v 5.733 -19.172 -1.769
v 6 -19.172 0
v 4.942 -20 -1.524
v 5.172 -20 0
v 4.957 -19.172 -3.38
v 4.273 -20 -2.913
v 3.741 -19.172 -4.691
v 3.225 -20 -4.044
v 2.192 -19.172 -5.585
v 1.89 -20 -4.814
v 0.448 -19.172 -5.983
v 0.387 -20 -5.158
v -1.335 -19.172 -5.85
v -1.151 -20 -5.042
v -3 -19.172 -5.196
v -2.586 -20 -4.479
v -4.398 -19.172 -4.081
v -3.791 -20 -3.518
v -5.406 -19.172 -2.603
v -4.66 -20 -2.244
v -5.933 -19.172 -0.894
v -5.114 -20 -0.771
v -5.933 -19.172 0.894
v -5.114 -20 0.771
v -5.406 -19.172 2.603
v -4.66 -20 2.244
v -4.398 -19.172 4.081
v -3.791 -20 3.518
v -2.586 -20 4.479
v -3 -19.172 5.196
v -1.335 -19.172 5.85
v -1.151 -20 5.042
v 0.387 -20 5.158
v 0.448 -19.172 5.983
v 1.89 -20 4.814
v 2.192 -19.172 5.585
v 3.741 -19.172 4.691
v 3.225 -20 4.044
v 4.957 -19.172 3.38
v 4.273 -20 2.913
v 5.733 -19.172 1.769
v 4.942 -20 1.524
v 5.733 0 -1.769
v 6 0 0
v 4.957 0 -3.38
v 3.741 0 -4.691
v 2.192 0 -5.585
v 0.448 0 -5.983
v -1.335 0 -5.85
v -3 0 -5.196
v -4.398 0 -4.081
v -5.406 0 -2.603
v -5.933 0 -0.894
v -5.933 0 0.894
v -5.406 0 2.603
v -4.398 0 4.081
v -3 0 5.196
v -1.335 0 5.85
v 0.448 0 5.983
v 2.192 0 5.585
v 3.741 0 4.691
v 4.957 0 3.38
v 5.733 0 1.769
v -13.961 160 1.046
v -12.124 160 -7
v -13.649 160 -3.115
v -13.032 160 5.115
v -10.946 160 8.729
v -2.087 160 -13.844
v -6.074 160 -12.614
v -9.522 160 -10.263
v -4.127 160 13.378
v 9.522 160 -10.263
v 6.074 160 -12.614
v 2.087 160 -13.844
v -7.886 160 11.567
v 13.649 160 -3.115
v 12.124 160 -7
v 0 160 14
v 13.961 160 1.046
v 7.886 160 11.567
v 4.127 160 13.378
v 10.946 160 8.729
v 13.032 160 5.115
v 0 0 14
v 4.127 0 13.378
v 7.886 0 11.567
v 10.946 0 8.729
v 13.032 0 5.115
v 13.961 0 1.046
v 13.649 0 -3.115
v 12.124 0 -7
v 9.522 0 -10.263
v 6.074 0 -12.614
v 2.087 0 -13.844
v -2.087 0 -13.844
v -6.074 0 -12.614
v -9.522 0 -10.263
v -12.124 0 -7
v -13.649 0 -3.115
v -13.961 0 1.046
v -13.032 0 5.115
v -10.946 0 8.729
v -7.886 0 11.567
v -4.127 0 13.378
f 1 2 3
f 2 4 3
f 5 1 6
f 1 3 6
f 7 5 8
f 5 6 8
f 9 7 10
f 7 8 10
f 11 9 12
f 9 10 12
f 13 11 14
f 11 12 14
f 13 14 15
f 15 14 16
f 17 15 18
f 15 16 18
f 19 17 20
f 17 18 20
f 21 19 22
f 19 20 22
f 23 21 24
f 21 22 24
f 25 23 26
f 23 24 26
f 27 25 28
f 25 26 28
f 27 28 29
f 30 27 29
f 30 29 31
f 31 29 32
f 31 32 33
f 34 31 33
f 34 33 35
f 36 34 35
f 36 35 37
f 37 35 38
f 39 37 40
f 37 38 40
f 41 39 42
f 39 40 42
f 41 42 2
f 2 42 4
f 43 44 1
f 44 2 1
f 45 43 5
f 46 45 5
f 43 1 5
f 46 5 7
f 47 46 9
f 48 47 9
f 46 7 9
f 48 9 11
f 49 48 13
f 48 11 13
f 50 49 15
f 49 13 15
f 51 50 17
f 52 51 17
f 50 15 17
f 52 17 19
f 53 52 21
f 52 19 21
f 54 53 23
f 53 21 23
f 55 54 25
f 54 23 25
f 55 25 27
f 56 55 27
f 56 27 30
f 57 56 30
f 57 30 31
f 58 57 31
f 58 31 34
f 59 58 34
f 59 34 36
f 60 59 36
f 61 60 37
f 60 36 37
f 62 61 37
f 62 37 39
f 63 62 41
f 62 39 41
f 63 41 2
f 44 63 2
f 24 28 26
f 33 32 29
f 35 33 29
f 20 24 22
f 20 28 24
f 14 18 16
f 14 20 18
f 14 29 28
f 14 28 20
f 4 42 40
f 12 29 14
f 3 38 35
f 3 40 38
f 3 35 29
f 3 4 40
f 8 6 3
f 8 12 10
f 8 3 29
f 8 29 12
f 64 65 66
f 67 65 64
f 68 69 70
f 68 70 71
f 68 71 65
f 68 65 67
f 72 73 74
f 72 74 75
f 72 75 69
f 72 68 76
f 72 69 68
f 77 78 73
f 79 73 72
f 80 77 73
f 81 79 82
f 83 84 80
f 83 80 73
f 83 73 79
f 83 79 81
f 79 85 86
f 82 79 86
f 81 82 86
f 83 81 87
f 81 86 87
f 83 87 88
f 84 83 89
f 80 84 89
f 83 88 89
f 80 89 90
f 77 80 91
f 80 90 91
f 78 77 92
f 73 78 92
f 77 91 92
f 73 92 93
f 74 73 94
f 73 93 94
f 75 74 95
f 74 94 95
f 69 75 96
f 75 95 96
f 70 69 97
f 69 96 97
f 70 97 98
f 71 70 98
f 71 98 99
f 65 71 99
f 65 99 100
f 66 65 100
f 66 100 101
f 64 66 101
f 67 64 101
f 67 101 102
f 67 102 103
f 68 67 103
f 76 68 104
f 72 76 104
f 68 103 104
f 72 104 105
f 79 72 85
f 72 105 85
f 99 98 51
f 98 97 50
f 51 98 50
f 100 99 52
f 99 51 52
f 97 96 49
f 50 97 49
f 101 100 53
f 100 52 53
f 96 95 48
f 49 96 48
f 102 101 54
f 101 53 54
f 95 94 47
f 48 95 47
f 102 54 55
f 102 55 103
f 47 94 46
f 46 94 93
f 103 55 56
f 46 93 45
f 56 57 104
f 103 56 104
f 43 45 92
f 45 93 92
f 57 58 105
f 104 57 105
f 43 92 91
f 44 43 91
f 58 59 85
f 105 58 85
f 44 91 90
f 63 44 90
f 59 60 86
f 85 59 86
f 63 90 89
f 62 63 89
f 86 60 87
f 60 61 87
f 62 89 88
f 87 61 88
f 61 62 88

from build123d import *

# Parameters (mm, degrees)
SKETCH1_R           = 14
BOSS_EXTRUDE1_DEPTH = 160
SKETCH2_R           = 10
BOSS_EXTRUDE2_DEPTH = 20


# Read off the part's stored shape, not the designer's step: M12x1.5 Machine Threads Stud1
with BuildPart() as part:
    # Sketch1 → Boss-Extrude1 (new body)
    with BuildSketch(Plane(origin=(0, 0, 0), x_dir=(1, 0, 0), z_dir=(0, 1, 0))):
        with Locations(Location((0, 0, 0), (0, 0, 270))):
            Circle(SKETCH1_R)
    extrude(amount=BOSS_EXTRUDE1_DEPTH)

    # Sketch2 → Boss-Extrude2 (add)
    with BuildSketch(Plane.XZ):
        with Locations(Location((0, 0, 0), (0, 0, 270))):
            Circle(SKETCH2_R)
    extrude(amount=BOSS_EXTRUDE2_DEPTH)

    # M12x1.5 Machine Threads Stud1 outline → M12x1.5 Machine Threads Stud1 (revolve, cut)
    with BuildSketch(Plane.XY):
        Polygon((10, 0), (6, 0), (6, -19.172), (5.172, -20), (10, -20), align=None)
    revolve(axis=Axis((0, 0, 0), (0, 1, 0)), mode=Mode.SUBTRACT)


solid = part.part
